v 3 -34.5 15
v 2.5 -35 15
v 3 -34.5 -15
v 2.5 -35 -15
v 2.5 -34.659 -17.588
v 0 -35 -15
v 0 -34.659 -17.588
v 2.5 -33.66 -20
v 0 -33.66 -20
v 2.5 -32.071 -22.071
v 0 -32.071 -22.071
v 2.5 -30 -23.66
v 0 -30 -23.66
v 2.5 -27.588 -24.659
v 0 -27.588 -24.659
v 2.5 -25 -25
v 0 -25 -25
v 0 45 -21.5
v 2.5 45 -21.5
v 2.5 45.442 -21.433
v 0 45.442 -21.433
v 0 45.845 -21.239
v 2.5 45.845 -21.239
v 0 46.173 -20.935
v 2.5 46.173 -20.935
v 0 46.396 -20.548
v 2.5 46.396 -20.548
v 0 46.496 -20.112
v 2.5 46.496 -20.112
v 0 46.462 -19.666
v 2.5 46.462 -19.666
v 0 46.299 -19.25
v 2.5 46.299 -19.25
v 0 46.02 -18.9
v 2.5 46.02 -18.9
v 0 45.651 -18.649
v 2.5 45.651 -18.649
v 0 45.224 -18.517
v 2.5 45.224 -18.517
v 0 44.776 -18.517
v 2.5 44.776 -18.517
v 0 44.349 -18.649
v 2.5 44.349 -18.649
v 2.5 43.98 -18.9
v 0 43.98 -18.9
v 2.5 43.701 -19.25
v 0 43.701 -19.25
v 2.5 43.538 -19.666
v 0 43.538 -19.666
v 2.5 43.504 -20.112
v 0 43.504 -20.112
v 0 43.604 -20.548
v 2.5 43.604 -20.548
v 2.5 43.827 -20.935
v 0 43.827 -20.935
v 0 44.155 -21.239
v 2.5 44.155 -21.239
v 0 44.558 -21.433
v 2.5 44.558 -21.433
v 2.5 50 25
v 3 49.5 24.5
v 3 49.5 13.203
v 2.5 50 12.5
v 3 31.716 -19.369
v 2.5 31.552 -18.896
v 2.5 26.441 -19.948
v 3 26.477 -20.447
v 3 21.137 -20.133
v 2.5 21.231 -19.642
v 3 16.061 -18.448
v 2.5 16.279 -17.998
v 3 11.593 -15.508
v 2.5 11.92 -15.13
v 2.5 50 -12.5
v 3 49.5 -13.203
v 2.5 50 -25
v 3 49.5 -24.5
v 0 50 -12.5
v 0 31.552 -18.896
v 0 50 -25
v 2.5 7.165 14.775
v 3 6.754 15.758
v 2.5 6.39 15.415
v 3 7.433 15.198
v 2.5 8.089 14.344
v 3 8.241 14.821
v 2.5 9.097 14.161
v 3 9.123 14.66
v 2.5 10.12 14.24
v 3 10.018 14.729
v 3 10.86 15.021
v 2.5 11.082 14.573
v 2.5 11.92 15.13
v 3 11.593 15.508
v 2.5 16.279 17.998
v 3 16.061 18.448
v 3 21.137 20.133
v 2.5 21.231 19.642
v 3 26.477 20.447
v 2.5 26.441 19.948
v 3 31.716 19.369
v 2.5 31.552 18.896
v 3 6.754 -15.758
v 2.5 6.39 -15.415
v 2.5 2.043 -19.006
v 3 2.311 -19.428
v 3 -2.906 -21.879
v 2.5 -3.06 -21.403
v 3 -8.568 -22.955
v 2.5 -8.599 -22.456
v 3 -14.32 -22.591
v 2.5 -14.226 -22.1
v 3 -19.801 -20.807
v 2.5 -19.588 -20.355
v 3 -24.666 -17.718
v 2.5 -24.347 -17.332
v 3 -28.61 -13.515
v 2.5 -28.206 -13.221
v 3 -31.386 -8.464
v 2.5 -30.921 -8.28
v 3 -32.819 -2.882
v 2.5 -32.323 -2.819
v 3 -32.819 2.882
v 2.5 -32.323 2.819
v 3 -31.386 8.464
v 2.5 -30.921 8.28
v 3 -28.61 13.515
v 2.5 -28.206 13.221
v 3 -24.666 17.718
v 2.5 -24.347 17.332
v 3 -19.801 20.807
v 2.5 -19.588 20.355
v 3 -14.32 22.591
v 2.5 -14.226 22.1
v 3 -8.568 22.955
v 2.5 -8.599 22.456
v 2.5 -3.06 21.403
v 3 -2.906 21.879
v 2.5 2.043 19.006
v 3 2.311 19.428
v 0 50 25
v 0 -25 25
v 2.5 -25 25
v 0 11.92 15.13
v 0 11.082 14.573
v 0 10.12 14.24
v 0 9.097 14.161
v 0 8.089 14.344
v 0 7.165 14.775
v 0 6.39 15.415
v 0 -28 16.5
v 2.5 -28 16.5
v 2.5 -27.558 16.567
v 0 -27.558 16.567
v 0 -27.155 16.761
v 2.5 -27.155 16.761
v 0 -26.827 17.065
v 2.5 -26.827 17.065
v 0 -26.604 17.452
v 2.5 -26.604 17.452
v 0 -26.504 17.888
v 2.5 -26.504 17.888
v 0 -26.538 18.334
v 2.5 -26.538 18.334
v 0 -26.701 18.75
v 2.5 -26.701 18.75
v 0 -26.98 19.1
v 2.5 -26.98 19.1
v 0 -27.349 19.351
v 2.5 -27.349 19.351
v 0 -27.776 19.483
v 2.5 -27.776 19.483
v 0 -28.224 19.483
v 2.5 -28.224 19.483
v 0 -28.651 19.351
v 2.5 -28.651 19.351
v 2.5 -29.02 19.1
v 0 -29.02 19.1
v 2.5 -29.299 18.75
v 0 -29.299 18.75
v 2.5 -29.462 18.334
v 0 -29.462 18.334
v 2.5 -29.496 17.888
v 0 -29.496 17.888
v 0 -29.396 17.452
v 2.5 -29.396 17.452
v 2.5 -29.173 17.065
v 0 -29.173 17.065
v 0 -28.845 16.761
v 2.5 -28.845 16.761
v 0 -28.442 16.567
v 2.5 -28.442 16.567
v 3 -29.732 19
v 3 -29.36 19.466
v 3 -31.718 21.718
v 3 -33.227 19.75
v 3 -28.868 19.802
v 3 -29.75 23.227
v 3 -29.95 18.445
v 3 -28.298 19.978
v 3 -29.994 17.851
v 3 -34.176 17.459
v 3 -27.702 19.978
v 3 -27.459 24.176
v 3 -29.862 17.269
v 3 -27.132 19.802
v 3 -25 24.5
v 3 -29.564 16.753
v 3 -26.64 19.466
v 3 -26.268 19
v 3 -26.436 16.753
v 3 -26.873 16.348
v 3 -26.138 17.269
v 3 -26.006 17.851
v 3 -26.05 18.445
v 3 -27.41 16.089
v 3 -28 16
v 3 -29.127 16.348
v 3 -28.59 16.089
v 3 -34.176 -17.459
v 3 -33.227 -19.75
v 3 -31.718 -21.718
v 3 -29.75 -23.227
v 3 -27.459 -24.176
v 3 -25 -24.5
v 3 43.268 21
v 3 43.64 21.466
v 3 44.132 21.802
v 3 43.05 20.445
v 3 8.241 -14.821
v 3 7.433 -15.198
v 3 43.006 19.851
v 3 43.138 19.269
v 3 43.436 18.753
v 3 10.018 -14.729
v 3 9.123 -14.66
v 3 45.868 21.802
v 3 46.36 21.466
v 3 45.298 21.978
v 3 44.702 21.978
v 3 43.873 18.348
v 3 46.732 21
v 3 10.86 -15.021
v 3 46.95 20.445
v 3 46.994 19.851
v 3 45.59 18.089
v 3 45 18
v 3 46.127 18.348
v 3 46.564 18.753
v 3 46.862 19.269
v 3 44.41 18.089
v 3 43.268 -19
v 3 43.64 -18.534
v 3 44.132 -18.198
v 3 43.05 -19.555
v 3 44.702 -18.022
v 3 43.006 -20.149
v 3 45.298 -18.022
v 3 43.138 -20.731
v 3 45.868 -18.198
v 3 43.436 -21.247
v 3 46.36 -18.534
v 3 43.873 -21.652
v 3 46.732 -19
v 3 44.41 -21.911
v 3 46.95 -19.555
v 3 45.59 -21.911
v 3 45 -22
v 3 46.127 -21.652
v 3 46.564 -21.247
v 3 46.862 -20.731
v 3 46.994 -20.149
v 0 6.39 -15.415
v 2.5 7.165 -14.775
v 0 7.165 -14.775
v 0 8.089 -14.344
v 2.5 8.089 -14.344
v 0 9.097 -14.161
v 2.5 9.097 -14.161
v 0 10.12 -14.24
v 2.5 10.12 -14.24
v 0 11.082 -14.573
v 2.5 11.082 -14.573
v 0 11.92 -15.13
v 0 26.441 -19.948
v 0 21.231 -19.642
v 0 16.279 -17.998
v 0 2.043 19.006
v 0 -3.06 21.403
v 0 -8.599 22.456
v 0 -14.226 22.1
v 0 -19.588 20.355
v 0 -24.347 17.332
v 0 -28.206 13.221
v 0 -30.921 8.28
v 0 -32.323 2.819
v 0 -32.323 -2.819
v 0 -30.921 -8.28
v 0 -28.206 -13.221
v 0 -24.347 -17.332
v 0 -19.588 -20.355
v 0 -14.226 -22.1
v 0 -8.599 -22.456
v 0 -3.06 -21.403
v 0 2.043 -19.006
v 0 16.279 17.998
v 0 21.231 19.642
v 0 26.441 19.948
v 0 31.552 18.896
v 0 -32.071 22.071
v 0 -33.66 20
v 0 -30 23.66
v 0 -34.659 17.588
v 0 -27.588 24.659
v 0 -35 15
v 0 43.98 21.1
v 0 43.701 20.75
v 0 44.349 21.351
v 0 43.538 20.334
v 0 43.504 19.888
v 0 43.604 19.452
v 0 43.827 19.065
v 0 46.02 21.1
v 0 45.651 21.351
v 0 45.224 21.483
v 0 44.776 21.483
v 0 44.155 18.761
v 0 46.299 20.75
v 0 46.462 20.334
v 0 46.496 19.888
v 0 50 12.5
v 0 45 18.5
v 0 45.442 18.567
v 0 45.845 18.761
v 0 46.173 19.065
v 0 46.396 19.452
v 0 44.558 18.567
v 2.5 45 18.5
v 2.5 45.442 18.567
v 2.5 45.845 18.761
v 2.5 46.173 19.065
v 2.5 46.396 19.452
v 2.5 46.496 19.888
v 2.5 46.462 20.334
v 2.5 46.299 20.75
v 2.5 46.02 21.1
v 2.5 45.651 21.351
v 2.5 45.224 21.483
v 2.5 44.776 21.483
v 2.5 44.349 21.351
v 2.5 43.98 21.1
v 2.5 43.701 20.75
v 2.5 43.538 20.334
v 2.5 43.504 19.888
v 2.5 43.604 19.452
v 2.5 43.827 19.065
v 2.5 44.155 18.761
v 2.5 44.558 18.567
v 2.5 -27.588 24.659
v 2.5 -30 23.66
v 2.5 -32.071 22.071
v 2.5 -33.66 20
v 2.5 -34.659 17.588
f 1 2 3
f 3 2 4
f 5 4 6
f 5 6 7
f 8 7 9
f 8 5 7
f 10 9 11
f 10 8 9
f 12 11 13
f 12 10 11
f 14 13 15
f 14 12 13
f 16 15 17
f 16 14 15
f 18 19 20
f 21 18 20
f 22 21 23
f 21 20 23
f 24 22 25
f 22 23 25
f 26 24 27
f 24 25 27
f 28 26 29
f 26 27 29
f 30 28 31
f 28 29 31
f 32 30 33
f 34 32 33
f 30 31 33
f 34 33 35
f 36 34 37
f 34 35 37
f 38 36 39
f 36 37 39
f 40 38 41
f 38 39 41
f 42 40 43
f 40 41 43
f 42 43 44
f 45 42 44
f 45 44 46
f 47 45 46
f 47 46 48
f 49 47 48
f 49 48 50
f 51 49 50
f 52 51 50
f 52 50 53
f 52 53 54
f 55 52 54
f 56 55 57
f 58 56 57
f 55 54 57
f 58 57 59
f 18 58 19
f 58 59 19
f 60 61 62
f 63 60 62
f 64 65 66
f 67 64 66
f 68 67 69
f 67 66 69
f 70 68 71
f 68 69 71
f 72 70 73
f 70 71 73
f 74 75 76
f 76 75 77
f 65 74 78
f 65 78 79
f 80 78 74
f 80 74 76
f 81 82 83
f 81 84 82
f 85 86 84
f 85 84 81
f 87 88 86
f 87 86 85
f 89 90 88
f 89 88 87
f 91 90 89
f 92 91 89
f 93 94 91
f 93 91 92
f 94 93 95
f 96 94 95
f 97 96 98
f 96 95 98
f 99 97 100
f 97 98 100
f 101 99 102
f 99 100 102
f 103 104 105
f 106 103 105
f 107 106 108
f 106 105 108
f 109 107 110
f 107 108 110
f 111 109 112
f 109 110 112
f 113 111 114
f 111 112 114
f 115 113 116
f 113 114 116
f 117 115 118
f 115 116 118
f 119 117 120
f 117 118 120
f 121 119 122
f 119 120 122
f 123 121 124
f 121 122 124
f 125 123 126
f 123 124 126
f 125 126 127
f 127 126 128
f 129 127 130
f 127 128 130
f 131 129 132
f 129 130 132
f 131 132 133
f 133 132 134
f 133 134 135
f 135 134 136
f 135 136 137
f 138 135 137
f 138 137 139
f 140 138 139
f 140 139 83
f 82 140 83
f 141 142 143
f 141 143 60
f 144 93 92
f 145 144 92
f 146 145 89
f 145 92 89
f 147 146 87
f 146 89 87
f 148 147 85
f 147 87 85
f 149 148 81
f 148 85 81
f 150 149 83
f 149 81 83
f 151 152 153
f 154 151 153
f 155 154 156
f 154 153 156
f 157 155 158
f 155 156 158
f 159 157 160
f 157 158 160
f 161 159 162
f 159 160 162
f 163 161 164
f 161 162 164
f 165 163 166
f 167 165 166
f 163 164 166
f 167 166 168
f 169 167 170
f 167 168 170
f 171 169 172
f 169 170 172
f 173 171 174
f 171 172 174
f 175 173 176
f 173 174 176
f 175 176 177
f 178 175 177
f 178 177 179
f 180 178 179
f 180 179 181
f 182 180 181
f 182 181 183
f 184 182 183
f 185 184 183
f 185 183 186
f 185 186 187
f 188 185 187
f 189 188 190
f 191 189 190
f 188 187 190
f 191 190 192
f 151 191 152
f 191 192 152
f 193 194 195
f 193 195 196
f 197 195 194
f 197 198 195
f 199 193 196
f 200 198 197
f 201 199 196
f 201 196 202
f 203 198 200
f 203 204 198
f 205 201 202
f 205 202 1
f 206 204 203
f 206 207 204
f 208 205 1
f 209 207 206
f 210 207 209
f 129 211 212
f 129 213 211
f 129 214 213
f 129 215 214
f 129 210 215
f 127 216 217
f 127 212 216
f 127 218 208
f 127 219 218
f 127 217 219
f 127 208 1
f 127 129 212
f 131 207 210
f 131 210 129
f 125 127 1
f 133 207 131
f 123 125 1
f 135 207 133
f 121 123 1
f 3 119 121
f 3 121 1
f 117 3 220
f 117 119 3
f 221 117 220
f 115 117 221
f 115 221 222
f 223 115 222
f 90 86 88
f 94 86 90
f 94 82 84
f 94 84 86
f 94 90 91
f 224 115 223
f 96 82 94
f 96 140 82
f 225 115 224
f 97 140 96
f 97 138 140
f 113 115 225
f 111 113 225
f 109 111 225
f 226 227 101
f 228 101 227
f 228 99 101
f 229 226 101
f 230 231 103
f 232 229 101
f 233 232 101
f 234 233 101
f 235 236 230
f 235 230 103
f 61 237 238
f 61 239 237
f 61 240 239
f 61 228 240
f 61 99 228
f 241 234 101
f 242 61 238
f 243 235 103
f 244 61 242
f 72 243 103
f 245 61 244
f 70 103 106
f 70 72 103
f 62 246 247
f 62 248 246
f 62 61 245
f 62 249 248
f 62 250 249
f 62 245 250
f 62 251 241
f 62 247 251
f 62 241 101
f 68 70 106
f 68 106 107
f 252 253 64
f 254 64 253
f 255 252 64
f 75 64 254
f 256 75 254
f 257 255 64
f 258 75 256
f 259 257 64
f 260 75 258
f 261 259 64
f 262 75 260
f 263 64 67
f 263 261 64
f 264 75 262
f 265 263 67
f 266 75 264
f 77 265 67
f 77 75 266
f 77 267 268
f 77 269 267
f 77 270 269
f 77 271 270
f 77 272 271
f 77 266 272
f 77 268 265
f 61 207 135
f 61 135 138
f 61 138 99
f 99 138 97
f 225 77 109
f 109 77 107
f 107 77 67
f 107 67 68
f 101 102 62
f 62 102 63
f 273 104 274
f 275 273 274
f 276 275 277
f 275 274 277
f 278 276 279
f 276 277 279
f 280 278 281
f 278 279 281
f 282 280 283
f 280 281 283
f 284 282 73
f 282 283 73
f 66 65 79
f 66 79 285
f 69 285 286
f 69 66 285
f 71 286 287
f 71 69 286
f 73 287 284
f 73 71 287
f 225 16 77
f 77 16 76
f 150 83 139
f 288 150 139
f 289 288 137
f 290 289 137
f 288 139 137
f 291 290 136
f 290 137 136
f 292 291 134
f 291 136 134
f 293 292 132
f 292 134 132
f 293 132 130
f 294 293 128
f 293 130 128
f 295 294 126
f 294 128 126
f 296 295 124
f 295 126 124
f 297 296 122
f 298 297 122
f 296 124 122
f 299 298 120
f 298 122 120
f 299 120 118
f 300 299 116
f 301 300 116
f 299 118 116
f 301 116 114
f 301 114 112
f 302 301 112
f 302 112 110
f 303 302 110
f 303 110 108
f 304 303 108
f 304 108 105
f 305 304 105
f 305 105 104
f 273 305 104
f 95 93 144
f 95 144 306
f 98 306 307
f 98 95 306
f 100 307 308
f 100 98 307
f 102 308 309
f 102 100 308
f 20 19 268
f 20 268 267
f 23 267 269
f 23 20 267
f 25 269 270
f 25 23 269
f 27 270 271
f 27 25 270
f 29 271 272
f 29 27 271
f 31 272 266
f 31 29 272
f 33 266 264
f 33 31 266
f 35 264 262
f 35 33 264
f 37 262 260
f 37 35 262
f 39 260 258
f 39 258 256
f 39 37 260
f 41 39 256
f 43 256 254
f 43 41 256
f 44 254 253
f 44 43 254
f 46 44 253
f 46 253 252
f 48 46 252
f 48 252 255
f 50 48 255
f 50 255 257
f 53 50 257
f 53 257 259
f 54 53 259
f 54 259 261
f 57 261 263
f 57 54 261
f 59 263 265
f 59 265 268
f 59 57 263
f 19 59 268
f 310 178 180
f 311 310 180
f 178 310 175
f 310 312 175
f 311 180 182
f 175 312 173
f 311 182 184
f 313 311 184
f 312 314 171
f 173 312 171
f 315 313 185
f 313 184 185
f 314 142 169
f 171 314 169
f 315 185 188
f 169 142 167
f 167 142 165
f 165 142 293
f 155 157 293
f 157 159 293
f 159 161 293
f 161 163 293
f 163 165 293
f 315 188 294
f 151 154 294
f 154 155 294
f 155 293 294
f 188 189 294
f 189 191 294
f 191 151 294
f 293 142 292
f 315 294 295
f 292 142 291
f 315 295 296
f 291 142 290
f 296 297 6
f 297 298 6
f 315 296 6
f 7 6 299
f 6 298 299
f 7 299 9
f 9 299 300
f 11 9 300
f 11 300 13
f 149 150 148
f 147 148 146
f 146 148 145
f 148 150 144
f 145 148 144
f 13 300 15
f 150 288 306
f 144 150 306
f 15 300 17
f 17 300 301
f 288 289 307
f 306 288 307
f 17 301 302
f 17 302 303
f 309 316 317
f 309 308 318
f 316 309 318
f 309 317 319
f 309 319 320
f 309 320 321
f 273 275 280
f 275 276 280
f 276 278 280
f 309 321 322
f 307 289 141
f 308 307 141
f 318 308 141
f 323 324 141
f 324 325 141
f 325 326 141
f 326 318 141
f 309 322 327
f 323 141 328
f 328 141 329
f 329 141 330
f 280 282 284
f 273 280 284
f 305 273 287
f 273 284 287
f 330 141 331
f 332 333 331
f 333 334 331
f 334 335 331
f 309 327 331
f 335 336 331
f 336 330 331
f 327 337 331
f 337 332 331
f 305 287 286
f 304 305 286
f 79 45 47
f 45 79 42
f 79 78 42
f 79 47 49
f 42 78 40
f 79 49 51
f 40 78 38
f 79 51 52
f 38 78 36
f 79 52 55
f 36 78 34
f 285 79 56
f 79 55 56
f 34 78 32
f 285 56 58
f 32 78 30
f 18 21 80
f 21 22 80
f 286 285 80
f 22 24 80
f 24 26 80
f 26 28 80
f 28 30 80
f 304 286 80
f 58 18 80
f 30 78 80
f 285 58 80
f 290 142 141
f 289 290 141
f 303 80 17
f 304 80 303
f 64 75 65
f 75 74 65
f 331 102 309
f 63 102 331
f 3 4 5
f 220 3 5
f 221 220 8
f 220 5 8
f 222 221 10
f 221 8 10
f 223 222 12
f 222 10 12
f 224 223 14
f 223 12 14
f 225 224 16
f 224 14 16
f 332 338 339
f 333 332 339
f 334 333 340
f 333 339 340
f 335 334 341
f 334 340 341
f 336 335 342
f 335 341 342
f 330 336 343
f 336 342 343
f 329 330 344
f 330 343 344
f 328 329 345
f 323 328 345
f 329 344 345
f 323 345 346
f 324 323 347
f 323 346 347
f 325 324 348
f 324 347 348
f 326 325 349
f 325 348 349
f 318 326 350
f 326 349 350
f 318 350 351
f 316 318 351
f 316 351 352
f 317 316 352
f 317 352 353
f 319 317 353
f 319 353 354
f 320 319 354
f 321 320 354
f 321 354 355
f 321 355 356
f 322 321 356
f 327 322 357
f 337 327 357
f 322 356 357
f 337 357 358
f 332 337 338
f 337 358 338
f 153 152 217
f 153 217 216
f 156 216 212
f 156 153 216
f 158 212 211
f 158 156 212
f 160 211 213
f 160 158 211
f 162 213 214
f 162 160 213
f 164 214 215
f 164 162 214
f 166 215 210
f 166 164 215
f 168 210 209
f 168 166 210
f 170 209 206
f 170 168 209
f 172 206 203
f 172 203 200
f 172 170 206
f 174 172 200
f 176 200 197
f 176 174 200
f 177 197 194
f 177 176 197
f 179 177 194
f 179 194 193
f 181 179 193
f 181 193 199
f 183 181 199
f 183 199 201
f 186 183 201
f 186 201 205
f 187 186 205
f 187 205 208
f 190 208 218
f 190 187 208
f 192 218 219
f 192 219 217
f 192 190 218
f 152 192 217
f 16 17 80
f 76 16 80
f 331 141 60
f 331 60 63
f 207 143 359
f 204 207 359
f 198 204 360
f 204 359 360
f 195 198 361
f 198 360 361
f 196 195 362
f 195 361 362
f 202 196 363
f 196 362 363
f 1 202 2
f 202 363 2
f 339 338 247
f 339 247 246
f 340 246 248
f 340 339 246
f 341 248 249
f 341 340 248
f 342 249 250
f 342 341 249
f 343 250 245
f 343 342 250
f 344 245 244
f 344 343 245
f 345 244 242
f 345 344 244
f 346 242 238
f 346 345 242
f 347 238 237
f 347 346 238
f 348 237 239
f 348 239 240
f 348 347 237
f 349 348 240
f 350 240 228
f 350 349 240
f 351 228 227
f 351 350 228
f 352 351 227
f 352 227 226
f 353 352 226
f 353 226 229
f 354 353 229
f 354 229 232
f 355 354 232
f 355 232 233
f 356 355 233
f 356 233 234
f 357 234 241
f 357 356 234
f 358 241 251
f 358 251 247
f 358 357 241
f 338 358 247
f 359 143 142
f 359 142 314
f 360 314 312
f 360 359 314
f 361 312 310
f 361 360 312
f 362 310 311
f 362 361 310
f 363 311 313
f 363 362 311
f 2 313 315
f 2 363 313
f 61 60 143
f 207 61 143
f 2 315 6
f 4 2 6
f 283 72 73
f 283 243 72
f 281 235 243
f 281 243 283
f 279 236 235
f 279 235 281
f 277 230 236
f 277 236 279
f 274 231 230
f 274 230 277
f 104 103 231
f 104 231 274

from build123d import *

# Parameters (mm, degrees)
SKETCH_1_W          = 50
SKETCH_1_H          = 85
EXTRUDE_1_DEPTH     = 3
FILLET_2_R          = 10
SKETCH_4_R          = 1.5
CUT_EXTRUDE_1_DEPTH = 3
CHAMFER_1_SIZE      = 0.5
CUT_EXTRUDE_3_DEPTH = 3
SKETCH_7_R          = 22.5
CUT_EXTRUDE_4_DEPTH = 3
FILLET_4_R          = 4
CHAMFER_2_SIZE      = 0.5
CHAMFER_3_SIZE      = 0.5


with BuildPart() as part:
    # 草图1 → 凸台-拉伸1 (new body)
    with BuildSketch(Plane(origin=(0, 0, 0), x_dir=(0, 0, -1), z_dir=(1, 0, 0))):
        with Locations((0, 7.5)):
            Rectangle(SKETCH_1_W, SKETCH_1_H)
    extrude(amount=EXTRUDE_1_DEPTH)

    # 圆角2
    fillet_2_edges = [part.edges().sort_by_distance(p)[0] for p in [
        (1.5, -35, -25),
        (1.5, -35, 25),
    ]]
    fillet(fillet_2_edges, radius=FILLET_2_R)

    # 草图4 → 切除-拉伸1 (cut)
    with BuildSketch(Plane(origin=(3, 0, 0), x_dir=(0, 0, -1), z_dir=(1, 0, 0))):
        with Locations((20, 45)):
            Circle(SKETCH_4_R)
        with Locations((-20, 45)):
            Circle(SKETCH_4_R)
        with Locations((-18, -28)):
            Circle(SKETCH_4_R)
    extrude(amount=-CUT_EXTRUDE_1_DEPTH, mode=Mode.SUBTRACT)

    # 倒角1
    chamfer_1_edges = [part.edges().sort_by_distance(p)[0] for p in [
        (3, 12.5, -25),
        (3, 50, 0),
        (3, -35, 0),
        (3, -32.071067812, 22.071067812),
        (3, -32.071067812, -22.071067812),
        (3, 12.5, 25),
    ]]
    chamfer(chamfer_1_edges, length=CHAMFER_1_SIZE)

    # 草图6 → 切除-拉伸3 (cut)
    with BuildSketch(Plane(origin=(3, 0, 0), x_dir=(0, 0, -1), z_dir=(1, 0, 0))):
        with BuildLine():
            Line((-12.5, 50), (12.5, 50))
            Line((12.5, 50), (18.896399481, 31.551800259))
            ThreePointArc((18.896399481, 31.551800259), (0, 5), (-18.896399481, 31.551800259))
            Line((-18.896399481, 31.551800259), (-12.5, 50))
        make_face()
    extrude(amount=-CUT_EXTRUDE_3_DEPTH, mode=Mode.SUBTRACT)

    # 草图7 → 切除-拉伸4 (cut)
    with BuildSketch(Plane(origin=(3, 0, 0), x_dir=(0, 0, -1), z_dir=(1, 0, 0))):
        with Locations((0, -10)):
            Circle(SKETCH_7_R)
    extrude(amount=-CUT_EXTRUDE_4_DEPTH, mode=Mode.SUBTRACT)

    # 圆角4
    fillet_4_edges = [part.edges().sort_by_distance(p)[0] for p in [
        (1.5, 9.017857143, 12.02377269),
        (1.5, 9.017857143, -12.02377269),
    ]]
    fillet(fillet_4_edges, radius=FILLET_4_R)

    # 倒角2
    chamfer_2_edges = [part.edges().sort_by_distance(p)[0] for p in [
        (3, 45, -18.5),
        (3, 45, 21.5),
        (3, -28, 19.5),
    ]]
    chamfer(chamfer_2_edges, length=CHAMFER_2_SIZE)

    # 倒角3
    chamfer_3_edges = [part.edges().sort_by_distance(p)[0] for p in [
        (3, 40.52590013, -15.784880278),
        (3, 21.231347471, -19.641722382),
        (3, 9.097355452, -14.160817784),
        (3, -32.5, 0),
        (3, 40.52590013, 15.784880278),
        (3, 9.097355452, 14.160817784),
        (3, 21.231347471, 19.641722382),
    ]]
    chamfer(chamfer_3_edges, length=CHAMFER_3_SIZE)


solid = part.part
